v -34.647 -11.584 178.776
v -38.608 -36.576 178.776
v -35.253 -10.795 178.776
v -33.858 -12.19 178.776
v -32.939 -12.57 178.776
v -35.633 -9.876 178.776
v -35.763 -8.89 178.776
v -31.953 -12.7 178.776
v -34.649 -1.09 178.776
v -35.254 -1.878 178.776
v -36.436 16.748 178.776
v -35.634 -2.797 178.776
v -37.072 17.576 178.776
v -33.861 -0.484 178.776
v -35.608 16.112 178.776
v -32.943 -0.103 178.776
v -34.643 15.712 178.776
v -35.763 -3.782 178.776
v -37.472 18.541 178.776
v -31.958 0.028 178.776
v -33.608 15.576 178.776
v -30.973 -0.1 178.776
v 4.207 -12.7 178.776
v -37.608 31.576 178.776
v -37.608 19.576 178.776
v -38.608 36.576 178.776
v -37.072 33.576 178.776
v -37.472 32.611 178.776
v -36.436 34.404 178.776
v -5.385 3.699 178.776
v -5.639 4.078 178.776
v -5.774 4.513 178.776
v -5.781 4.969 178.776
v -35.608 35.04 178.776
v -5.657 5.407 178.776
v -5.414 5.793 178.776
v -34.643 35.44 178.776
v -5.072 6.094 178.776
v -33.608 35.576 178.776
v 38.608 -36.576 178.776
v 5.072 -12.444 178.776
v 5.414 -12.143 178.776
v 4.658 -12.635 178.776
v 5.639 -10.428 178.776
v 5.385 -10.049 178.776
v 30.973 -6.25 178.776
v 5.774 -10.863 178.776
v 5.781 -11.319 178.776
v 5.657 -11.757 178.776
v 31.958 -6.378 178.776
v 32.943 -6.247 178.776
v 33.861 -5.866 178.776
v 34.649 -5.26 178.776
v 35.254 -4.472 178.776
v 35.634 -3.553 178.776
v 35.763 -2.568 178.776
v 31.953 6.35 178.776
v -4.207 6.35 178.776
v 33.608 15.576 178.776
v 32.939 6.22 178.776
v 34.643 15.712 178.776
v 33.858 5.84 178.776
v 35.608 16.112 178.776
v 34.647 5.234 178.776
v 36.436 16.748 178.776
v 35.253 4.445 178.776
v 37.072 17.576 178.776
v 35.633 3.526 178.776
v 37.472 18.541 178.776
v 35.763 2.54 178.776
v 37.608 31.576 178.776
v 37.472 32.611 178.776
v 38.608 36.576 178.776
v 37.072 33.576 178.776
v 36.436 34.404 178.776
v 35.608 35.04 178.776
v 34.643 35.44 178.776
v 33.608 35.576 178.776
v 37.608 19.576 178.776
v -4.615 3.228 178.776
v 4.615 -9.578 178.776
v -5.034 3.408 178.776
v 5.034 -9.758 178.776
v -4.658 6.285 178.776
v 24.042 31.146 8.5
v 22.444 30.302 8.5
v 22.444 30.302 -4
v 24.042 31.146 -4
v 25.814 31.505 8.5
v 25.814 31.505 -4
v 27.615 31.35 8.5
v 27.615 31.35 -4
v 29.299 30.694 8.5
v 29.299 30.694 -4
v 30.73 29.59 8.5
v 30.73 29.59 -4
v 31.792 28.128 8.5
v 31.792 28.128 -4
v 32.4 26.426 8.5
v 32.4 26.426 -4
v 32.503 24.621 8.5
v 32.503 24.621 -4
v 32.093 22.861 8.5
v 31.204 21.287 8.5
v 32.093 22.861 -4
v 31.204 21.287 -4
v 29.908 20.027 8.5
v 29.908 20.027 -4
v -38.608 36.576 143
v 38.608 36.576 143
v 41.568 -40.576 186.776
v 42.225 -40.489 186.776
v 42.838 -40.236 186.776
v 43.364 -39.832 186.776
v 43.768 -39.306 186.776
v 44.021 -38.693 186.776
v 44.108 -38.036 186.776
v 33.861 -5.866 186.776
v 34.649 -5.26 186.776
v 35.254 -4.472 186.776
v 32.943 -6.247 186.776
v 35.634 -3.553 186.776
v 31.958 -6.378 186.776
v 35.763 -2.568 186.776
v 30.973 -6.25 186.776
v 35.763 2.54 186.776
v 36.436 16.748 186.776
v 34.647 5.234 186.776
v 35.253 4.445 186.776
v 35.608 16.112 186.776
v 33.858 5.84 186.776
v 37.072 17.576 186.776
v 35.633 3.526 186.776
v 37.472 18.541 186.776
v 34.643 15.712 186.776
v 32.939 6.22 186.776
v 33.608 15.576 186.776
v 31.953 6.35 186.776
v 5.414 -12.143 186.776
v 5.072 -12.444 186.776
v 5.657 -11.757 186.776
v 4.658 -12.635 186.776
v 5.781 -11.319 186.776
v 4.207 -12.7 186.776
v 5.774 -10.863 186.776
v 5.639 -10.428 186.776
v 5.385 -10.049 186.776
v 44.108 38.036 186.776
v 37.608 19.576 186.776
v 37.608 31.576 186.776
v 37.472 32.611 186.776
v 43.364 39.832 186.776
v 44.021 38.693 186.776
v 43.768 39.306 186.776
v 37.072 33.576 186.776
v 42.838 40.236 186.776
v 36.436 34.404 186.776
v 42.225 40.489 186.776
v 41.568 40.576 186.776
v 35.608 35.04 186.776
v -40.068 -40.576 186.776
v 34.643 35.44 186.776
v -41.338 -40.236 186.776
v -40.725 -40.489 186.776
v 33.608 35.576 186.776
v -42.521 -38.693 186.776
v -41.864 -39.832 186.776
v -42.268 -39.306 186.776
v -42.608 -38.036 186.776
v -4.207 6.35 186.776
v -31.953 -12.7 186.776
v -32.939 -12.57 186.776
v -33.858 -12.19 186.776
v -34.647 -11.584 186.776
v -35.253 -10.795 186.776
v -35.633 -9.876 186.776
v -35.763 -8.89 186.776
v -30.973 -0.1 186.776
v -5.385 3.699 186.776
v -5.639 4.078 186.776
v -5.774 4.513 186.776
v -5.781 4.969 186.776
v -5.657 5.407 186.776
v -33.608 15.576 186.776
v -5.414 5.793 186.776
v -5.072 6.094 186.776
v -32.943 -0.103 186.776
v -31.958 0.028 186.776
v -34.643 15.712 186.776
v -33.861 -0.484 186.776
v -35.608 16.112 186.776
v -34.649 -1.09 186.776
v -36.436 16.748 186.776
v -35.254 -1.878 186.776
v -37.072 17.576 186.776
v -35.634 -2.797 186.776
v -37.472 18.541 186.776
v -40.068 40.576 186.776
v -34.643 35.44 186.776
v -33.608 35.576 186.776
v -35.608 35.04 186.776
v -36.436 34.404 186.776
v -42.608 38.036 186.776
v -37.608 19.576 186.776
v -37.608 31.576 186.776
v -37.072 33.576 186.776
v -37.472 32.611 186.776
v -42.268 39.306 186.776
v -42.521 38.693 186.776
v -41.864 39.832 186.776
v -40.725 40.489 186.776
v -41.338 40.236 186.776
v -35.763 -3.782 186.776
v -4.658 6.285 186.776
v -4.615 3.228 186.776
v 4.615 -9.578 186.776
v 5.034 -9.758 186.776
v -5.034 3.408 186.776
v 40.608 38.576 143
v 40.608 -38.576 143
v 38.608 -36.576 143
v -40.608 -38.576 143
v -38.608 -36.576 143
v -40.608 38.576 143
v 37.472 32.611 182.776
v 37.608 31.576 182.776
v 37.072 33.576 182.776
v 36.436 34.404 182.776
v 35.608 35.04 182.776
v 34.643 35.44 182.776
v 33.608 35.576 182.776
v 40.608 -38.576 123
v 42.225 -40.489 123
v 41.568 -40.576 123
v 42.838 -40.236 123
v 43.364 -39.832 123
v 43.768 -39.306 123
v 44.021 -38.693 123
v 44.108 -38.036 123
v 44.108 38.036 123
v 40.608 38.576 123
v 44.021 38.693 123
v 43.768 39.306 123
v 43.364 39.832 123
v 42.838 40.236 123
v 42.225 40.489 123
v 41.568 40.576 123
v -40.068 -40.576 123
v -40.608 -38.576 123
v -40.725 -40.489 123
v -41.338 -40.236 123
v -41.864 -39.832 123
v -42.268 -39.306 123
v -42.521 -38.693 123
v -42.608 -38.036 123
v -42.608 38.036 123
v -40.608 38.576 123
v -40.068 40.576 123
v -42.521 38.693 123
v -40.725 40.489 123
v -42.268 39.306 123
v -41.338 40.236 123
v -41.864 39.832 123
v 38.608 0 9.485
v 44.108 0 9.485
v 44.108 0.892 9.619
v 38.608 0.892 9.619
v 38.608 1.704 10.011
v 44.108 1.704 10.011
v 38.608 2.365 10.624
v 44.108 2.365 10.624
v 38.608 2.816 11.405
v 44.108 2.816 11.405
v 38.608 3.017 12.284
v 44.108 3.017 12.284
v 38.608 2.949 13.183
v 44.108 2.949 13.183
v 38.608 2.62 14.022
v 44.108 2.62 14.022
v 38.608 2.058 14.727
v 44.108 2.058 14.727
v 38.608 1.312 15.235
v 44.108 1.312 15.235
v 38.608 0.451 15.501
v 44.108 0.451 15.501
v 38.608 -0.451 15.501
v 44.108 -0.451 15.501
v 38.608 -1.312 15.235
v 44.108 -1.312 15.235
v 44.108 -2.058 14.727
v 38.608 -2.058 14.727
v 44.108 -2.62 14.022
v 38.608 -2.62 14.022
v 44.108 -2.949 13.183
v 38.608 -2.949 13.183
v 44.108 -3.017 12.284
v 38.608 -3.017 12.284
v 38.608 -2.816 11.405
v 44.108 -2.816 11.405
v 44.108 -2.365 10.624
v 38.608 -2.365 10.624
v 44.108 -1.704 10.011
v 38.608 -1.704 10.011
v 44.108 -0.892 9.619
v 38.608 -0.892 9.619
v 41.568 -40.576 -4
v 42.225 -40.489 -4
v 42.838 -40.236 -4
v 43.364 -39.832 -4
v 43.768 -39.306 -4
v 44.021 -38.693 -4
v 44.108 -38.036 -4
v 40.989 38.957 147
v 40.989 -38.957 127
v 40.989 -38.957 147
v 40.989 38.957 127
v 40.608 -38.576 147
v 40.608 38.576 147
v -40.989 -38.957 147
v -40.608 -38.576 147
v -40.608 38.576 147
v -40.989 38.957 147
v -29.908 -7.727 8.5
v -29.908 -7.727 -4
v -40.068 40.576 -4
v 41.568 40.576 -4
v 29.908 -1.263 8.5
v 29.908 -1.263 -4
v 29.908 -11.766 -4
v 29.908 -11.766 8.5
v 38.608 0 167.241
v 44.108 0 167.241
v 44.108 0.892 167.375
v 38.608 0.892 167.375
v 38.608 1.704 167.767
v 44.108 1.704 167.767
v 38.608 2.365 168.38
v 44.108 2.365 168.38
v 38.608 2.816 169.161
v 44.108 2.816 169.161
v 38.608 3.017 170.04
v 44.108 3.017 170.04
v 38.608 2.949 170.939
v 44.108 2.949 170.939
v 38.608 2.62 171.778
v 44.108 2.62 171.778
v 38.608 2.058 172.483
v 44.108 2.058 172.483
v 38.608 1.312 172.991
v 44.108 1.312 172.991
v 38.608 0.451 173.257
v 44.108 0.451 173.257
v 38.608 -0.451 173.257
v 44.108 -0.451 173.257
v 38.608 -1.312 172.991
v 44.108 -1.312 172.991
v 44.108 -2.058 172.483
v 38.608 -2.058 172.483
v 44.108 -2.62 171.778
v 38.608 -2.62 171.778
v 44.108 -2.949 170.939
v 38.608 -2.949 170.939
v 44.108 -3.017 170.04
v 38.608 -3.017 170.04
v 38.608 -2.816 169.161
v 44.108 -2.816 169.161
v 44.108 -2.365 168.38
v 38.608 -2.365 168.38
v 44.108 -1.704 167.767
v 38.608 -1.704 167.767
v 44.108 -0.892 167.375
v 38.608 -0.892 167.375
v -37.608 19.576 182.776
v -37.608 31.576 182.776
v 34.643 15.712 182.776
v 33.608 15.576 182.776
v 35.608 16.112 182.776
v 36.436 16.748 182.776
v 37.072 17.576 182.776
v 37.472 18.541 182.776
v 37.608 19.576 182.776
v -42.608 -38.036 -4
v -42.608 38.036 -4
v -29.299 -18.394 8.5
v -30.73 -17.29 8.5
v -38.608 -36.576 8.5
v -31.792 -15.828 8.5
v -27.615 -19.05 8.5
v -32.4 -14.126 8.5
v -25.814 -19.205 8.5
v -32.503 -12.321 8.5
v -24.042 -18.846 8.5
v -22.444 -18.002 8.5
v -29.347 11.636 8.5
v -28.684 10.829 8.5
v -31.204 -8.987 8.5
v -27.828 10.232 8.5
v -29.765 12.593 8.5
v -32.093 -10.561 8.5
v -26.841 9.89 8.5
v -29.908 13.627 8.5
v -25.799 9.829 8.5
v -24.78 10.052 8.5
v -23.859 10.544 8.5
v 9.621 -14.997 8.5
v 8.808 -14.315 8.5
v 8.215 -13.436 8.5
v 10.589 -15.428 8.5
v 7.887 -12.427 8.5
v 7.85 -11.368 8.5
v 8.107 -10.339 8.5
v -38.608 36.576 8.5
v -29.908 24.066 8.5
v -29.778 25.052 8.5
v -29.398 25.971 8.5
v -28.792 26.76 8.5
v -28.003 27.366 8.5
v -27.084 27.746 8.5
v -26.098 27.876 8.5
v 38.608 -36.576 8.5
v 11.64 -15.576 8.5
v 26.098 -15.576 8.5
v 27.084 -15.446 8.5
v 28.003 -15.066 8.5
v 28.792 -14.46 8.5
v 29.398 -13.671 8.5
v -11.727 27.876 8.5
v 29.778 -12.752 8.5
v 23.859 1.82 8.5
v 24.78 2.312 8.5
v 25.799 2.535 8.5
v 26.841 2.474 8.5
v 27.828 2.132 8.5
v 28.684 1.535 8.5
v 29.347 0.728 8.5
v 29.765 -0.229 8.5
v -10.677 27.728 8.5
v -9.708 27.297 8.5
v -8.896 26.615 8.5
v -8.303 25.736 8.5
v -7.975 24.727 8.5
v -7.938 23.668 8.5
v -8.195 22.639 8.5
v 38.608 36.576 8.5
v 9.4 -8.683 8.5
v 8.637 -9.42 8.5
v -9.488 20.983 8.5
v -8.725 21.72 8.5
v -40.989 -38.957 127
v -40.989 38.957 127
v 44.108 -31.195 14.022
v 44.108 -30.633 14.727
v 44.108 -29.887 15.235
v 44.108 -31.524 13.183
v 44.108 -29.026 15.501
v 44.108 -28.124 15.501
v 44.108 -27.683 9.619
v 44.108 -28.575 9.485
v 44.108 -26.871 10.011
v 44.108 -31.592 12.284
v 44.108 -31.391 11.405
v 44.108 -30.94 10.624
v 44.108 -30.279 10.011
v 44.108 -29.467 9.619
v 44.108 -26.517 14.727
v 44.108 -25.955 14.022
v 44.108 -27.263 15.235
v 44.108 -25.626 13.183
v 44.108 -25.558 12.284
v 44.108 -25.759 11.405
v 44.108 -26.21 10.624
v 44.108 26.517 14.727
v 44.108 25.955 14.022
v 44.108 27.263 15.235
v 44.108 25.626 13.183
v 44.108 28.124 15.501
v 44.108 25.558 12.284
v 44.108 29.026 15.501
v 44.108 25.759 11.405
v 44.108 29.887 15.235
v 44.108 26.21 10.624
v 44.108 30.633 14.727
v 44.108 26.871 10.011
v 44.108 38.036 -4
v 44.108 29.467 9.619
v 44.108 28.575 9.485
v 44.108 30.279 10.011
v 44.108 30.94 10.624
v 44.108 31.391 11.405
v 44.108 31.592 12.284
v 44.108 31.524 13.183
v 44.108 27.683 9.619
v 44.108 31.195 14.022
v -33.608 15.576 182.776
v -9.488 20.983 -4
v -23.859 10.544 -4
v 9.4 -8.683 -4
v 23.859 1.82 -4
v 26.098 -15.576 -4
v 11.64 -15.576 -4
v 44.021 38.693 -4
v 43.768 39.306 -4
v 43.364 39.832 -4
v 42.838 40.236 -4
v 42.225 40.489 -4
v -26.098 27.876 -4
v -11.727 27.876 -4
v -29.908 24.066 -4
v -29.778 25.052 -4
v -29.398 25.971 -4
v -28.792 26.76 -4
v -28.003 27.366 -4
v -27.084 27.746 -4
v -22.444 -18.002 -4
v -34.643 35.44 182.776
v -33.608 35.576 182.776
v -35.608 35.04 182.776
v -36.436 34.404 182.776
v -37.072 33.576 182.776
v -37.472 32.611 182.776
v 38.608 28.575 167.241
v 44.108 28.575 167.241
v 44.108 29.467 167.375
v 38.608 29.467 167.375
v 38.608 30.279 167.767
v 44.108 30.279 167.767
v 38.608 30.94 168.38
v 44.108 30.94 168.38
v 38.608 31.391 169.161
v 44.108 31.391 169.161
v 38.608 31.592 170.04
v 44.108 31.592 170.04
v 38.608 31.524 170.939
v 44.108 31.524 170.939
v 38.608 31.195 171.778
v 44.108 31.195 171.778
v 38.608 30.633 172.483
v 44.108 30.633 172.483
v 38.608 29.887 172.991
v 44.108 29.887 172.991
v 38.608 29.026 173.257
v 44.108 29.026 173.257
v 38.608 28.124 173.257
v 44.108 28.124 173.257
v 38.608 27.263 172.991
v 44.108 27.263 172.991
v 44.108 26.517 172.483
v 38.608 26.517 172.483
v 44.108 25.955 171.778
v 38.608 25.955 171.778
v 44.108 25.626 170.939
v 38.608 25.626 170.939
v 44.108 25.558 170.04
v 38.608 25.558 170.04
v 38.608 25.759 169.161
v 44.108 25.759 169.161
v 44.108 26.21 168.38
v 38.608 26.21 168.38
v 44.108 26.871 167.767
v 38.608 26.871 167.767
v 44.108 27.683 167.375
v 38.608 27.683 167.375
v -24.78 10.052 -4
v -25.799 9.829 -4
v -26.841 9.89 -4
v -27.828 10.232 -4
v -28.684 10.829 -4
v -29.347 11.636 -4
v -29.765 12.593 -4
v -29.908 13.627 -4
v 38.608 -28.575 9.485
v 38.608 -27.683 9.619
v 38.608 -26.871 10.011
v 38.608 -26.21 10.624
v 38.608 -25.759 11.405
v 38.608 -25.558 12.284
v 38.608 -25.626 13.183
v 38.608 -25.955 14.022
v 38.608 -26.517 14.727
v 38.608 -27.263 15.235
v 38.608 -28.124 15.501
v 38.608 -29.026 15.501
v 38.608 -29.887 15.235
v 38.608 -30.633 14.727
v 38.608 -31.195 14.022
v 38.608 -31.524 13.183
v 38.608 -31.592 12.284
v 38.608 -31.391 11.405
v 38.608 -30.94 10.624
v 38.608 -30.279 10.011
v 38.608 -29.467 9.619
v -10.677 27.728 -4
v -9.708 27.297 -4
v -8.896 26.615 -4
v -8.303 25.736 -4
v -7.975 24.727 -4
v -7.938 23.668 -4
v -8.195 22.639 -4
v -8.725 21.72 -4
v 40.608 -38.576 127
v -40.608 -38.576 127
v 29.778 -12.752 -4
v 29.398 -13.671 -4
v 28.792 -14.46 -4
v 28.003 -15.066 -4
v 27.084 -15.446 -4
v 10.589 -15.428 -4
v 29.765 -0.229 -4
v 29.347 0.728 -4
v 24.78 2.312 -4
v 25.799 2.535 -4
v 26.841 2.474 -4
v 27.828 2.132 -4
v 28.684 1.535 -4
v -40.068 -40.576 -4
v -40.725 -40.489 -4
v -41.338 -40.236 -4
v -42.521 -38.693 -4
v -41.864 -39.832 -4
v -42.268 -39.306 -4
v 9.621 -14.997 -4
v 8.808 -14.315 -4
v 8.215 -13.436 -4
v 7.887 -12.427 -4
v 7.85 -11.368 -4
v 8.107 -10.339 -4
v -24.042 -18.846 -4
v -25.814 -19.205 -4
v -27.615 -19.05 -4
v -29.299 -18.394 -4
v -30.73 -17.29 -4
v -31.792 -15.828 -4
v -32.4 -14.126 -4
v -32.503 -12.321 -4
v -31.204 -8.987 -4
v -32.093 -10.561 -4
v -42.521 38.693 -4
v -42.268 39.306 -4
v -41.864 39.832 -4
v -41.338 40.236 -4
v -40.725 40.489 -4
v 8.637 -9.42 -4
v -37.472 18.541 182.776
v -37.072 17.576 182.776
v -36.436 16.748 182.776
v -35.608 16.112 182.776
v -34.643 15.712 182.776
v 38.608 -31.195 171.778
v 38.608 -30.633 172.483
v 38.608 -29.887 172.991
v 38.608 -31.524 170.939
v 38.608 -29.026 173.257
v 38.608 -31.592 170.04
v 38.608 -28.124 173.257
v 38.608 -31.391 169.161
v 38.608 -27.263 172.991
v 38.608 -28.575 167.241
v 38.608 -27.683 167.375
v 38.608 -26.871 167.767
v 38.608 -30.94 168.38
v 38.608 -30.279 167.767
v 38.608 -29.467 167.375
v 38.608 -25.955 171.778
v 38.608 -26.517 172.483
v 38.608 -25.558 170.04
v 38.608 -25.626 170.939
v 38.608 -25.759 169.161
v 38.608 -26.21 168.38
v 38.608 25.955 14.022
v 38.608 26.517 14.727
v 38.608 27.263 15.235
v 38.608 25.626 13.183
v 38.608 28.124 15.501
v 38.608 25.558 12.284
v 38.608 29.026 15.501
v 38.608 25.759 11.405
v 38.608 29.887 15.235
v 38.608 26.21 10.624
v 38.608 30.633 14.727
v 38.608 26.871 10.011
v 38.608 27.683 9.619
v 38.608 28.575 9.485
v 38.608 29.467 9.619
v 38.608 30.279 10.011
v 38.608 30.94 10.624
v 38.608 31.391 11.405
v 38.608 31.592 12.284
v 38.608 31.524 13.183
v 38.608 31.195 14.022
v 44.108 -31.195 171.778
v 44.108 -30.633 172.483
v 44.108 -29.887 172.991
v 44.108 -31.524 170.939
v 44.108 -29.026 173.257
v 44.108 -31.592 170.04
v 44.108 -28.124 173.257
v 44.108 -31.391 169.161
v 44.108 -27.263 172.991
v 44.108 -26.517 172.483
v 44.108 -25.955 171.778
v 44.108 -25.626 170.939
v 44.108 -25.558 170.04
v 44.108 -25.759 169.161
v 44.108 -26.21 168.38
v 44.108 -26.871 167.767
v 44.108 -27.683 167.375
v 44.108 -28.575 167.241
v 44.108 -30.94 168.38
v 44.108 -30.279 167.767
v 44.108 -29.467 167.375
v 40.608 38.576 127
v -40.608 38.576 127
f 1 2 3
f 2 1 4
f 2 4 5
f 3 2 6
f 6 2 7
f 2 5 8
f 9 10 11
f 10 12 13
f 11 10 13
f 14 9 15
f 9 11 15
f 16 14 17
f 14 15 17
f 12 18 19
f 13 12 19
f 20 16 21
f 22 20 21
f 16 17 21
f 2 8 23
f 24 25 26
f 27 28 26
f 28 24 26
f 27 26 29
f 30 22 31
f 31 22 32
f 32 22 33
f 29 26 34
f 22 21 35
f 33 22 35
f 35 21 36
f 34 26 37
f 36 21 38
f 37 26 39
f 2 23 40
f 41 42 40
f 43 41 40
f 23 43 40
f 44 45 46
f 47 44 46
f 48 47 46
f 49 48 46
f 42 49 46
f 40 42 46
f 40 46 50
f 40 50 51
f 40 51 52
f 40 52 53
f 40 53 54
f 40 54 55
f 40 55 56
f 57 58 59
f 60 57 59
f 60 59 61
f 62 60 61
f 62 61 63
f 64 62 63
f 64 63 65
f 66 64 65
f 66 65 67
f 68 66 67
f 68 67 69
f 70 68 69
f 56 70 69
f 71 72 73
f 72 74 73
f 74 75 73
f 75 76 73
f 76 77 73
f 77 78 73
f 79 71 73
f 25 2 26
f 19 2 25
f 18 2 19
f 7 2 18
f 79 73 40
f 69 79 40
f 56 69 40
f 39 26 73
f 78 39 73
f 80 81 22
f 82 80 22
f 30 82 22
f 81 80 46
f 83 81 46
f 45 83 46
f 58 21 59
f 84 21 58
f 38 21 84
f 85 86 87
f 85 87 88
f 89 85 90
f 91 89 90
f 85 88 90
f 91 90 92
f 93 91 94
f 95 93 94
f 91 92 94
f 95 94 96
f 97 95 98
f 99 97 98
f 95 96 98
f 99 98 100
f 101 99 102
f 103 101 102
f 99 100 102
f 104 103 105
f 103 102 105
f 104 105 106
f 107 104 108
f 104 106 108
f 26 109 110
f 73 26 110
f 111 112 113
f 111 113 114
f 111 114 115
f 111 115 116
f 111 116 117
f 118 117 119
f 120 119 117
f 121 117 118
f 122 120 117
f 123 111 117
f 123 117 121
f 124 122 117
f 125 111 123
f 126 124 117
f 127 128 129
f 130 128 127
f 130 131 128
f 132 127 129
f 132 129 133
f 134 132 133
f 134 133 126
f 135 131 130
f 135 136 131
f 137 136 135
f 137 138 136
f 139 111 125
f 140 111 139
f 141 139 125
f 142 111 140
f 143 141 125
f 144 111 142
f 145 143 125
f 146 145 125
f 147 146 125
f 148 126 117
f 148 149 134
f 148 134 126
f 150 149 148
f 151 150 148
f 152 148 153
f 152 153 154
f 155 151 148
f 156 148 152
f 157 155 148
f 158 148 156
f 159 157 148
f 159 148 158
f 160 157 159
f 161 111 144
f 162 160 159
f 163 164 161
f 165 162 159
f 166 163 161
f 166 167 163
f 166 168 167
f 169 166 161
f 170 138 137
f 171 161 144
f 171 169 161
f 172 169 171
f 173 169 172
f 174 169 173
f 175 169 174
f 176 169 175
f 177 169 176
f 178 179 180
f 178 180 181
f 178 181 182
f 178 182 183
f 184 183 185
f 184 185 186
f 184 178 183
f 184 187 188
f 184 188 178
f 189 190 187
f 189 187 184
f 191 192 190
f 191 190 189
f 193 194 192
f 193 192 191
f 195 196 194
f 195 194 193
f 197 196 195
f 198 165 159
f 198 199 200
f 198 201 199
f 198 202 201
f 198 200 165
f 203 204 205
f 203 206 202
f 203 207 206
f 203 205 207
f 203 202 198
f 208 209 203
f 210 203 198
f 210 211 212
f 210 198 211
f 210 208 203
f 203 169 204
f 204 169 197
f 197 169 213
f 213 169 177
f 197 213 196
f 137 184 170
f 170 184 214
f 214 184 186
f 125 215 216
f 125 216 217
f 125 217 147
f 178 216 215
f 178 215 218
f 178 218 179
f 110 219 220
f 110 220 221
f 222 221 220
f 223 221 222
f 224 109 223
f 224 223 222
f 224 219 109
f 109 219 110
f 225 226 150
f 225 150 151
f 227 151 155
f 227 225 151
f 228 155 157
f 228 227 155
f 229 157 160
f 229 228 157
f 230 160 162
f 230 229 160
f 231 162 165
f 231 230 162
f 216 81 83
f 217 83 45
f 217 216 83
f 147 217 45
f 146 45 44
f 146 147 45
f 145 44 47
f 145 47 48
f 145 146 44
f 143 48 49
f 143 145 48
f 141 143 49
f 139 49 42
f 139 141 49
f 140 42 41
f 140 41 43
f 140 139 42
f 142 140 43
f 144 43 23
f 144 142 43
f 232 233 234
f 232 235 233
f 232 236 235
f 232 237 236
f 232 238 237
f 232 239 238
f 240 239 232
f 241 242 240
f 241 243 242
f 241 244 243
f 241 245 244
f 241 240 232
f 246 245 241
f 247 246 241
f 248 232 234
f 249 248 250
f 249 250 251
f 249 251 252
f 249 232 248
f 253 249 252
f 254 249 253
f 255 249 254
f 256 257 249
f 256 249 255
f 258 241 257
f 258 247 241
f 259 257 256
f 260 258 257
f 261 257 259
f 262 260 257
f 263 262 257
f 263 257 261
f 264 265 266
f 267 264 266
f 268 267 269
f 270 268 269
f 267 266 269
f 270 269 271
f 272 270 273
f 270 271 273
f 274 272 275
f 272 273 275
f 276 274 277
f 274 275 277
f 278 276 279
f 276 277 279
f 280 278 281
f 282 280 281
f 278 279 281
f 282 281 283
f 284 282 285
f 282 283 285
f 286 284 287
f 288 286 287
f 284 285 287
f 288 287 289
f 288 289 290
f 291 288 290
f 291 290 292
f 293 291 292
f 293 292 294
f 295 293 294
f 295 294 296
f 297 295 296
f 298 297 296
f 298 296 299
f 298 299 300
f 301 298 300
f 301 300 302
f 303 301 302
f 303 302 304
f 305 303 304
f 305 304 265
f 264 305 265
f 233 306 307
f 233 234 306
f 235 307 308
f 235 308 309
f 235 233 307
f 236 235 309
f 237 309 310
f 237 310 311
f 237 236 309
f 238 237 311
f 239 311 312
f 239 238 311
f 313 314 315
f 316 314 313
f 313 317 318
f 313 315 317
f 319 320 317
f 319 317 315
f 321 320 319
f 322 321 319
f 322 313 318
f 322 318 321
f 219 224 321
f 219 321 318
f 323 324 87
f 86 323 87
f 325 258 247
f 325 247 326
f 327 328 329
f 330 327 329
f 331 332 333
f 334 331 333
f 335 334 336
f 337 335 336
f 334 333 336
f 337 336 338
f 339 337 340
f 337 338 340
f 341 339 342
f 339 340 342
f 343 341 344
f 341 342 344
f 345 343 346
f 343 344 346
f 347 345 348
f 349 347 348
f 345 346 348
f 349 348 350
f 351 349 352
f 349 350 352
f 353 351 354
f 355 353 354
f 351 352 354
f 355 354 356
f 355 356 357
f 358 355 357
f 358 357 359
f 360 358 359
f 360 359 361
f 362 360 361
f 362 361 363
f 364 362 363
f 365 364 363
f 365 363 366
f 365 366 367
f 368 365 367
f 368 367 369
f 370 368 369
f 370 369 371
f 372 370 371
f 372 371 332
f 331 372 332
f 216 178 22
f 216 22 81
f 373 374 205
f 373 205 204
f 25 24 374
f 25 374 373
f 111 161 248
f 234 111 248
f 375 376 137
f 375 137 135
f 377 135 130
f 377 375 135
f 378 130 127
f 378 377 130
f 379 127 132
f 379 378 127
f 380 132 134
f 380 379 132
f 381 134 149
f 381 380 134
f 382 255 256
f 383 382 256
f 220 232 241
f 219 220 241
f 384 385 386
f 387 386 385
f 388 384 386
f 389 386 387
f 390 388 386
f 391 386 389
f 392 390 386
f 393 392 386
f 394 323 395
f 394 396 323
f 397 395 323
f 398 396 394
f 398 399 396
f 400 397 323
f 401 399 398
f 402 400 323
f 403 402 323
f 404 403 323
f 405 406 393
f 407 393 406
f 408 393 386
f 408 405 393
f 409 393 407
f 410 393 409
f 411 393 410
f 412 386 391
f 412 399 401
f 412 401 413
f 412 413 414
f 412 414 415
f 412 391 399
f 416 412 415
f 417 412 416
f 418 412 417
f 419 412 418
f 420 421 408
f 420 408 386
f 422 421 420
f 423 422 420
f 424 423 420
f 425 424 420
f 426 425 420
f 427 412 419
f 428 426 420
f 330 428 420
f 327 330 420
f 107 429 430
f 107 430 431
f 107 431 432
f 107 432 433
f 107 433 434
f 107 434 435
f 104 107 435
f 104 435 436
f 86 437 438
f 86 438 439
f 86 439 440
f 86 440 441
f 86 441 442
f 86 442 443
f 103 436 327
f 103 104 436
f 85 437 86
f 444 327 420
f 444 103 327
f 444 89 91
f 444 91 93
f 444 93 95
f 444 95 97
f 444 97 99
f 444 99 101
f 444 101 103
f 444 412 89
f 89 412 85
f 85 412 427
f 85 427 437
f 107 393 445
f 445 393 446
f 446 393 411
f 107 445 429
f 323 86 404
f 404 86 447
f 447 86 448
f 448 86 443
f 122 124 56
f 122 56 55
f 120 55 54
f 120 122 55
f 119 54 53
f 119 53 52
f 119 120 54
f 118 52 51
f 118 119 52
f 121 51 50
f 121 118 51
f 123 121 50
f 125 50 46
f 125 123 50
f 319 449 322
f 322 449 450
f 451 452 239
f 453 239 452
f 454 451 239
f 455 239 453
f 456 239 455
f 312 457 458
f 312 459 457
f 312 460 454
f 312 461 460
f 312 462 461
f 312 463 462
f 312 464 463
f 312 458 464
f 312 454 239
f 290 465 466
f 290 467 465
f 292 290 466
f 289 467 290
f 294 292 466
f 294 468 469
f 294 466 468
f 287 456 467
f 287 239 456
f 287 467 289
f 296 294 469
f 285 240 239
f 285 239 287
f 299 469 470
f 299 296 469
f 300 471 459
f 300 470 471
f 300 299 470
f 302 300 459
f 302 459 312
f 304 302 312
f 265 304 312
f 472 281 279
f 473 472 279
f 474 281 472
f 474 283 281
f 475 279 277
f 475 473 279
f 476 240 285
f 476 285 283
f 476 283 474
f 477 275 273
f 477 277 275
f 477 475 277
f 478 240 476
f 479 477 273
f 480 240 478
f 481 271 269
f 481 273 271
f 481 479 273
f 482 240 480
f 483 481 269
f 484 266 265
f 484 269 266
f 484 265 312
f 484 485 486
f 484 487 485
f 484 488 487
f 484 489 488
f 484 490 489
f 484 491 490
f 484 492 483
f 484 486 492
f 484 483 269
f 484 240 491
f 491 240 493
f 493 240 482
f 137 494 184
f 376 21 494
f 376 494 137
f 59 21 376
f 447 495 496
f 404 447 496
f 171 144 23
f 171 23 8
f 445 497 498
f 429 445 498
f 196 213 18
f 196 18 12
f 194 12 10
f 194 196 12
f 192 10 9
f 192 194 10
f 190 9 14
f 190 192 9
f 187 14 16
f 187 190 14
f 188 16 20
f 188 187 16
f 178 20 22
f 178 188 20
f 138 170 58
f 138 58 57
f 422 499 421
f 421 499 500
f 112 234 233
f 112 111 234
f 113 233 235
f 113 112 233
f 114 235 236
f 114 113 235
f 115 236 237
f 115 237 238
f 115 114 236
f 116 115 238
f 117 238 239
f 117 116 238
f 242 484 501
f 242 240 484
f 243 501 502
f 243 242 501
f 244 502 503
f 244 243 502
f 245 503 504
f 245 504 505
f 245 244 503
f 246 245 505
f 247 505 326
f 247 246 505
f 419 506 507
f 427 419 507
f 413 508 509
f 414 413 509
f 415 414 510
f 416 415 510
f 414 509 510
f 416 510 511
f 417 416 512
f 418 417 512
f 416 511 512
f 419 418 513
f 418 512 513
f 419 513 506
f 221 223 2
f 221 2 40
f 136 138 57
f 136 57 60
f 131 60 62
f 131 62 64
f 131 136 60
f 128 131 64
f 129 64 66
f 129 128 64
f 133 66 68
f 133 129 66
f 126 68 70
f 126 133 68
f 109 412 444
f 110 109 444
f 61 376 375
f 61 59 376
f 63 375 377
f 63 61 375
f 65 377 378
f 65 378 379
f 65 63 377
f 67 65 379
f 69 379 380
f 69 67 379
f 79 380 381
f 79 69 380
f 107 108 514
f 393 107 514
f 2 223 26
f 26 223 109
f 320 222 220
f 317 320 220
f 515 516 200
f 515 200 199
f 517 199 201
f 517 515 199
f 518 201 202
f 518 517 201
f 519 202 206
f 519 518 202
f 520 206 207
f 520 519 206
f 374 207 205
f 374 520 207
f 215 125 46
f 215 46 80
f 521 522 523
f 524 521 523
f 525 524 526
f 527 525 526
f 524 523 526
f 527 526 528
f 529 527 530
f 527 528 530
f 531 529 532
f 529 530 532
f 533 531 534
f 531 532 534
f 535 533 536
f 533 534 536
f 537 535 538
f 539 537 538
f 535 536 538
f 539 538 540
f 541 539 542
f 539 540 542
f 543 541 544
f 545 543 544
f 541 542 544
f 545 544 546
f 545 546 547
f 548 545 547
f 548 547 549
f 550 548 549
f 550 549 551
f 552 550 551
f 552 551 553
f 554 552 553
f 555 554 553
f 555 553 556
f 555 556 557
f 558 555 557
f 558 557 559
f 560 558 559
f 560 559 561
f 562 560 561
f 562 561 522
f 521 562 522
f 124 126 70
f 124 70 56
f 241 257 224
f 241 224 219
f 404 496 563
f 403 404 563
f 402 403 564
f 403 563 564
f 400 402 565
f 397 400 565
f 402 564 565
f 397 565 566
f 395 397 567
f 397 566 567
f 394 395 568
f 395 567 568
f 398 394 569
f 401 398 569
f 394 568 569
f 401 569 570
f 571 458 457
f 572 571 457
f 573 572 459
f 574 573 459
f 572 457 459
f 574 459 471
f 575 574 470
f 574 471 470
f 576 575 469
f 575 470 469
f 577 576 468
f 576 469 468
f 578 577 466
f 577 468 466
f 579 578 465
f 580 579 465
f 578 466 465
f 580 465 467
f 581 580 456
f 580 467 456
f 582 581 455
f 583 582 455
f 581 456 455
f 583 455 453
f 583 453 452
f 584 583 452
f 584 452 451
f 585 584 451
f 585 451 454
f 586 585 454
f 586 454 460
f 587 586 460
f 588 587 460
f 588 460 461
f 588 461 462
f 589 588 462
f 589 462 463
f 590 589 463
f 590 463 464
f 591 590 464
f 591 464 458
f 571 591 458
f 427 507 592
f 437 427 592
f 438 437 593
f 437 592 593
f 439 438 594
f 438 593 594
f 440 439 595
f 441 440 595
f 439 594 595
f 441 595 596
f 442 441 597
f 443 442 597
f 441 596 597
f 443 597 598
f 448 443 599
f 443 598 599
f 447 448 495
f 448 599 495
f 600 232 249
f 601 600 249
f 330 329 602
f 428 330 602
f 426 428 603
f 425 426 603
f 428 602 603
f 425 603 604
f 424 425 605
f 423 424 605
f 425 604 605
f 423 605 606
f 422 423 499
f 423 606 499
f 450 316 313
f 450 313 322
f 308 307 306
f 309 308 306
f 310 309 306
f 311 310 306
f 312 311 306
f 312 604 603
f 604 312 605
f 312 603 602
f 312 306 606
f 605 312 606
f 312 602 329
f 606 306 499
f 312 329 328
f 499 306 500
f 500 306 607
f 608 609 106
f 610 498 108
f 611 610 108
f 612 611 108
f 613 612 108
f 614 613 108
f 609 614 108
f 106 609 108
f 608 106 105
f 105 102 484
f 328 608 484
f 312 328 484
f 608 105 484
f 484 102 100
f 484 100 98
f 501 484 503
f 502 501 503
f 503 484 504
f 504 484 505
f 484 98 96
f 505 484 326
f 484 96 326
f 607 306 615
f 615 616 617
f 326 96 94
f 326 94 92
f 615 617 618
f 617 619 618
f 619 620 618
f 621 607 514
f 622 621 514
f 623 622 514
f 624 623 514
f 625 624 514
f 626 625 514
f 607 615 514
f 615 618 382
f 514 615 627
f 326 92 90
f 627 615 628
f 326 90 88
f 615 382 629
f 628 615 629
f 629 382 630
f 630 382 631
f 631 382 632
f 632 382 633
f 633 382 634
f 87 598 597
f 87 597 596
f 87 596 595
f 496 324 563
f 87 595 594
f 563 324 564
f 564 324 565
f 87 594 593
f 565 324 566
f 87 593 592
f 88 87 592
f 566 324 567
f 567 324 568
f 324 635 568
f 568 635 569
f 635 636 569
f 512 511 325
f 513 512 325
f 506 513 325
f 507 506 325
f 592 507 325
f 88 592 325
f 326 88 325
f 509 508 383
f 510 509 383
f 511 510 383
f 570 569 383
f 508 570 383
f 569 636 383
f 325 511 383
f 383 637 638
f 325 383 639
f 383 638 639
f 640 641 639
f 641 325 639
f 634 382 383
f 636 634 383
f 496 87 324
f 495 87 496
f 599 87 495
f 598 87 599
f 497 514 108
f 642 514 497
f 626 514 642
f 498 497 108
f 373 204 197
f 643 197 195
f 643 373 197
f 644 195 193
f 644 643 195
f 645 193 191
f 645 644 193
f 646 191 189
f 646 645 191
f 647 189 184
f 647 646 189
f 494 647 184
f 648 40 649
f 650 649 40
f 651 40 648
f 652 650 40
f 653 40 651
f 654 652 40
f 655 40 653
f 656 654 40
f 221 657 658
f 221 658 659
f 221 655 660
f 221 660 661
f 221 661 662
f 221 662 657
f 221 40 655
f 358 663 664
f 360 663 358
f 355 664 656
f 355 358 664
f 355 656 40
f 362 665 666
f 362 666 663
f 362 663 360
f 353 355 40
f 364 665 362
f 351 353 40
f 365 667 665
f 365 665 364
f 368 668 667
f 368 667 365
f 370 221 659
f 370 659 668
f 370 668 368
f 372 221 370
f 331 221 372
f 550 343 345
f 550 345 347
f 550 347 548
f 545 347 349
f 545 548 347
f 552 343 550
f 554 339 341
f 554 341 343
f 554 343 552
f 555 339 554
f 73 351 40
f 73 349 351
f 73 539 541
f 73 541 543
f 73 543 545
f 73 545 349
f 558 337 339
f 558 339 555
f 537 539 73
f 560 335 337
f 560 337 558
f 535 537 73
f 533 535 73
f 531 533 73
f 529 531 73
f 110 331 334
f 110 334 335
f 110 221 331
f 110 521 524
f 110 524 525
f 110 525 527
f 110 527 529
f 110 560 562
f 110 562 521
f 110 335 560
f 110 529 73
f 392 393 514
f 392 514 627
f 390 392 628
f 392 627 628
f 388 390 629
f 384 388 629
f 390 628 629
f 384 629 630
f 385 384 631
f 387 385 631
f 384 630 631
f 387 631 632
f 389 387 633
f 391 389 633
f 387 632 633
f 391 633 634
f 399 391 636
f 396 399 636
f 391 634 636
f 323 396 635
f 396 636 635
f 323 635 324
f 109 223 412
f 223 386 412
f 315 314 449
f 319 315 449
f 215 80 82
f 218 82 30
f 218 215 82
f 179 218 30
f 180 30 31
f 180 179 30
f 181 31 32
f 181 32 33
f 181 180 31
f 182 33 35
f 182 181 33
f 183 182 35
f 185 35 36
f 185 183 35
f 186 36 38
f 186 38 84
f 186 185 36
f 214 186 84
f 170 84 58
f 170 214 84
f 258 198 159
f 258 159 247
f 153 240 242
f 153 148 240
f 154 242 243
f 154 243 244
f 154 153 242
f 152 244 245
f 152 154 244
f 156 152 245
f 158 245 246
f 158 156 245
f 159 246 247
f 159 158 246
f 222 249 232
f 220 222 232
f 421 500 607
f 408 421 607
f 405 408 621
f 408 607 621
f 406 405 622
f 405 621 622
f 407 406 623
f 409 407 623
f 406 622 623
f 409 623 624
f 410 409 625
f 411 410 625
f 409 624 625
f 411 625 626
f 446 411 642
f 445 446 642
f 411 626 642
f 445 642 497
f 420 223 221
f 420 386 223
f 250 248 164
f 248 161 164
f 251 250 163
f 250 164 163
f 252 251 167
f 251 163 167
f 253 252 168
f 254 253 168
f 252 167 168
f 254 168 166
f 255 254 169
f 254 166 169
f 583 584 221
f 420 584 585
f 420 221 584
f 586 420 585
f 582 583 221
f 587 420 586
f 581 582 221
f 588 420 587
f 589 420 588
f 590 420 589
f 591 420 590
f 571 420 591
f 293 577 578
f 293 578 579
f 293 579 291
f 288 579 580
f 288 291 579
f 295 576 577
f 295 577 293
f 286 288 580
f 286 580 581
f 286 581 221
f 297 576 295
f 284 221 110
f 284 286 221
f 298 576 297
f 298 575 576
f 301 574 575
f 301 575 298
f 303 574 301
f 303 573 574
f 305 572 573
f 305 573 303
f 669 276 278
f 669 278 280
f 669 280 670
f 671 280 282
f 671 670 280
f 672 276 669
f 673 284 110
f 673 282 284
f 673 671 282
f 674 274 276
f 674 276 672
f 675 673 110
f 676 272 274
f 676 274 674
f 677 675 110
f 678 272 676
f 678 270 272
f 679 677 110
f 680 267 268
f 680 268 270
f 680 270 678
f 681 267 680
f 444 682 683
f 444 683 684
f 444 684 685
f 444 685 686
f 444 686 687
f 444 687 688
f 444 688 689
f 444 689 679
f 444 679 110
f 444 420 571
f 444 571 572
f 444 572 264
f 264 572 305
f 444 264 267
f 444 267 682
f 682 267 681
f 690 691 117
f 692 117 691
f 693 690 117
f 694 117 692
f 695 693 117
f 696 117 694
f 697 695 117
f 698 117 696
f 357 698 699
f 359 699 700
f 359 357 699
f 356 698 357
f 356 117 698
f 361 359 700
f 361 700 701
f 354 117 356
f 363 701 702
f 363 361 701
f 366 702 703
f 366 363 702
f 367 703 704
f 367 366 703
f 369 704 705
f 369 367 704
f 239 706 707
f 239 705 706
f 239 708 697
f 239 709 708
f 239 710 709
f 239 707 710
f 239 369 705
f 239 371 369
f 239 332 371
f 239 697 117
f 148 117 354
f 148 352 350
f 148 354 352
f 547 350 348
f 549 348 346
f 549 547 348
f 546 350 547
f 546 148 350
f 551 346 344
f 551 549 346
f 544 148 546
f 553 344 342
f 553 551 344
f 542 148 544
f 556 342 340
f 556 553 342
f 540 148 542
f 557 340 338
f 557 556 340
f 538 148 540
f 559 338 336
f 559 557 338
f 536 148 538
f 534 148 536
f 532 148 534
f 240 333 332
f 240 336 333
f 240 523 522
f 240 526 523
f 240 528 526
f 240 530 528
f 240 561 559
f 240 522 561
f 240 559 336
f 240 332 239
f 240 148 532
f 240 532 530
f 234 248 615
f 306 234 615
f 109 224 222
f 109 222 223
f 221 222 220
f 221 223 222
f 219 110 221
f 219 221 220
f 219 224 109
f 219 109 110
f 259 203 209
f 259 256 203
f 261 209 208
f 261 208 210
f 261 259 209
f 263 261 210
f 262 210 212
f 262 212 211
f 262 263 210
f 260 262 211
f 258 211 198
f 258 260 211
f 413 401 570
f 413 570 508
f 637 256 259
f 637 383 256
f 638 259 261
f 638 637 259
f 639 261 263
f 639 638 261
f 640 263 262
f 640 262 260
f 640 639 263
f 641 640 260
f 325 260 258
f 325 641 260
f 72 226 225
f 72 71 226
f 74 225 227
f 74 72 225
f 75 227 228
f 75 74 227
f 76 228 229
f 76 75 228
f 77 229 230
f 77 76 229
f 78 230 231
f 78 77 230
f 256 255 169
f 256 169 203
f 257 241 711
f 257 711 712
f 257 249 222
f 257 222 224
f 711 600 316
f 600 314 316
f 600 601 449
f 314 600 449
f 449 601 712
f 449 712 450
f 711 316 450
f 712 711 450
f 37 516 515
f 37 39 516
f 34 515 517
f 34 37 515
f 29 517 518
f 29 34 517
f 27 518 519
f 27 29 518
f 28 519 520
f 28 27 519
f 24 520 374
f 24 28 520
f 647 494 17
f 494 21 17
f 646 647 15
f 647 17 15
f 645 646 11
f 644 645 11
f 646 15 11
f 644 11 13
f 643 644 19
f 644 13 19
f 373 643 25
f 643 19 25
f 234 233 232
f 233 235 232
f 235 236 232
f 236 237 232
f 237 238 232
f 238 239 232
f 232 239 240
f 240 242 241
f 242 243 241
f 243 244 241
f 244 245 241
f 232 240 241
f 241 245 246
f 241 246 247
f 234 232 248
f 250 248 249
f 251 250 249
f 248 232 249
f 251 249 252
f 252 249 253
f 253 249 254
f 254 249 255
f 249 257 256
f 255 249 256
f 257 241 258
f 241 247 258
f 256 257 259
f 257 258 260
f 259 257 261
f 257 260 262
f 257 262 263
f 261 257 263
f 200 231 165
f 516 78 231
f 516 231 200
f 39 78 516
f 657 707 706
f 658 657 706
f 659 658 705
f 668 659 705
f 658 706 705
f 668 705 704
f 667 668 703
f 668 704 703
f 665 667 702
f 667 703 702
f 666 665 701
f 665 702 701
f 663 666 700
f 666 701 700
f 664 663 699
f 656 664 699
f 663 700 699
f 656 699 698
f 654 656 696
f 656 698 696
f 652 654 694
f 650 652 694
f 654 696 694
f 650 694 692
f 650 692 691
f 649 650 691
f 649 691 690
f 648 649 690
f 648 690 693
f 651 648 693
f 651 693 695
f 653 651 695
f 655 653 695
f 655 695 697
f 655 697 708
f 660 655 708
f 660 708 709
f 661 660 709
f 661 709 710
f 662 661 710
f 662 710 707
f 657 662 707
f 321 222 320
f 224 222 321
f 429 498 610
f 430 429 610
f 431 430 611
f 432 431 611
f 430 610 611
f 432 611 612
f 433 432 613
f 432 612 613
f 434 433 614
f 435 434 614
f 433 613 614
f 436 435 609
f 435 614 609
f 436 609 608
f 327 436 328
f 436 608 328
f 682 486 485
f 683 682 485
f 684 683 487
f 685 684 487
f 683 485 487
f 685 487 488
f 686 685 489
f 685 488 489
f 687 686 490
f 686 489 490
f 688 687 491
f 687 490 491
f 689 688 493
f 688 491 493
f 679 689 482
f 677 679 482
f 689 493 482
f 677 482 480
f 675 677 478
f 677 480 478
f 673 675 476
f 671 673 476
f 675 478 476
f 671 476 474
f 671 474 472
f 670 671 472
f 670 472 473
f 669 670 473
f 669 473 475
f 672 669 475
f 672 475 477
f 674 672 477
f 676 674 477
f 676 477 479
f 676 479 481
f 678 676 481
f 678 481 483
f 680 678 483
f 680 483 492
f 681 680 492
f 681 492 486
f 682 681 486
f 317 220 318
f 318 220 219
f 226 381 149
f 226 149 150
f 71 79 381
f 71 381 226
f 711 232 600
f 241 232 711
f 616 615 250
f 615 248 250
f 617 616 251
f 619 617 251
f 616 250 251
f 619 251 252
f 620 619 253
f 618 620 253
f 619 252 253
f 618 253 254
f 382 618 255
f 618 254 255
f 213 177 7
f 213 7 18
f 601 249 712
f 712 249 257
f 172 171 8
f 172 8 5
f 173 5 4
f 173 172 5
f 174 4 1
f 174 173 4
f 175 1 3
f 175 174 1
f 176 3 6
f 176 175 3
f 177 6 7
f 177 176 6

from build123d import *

# Parameters (mm, degrees)
SKETCH1_W            = 85.216
SKETCH1_H            = 81.152
BOSS_EXTRUDE1_DEPTH  = 182.776
SHELL2_T             = -4
SHELL3_T             = -4
SKETCH4_W            = 81.216
SKETCH4_H            = 77.152
SKETCH4_W_2          = 77.216
SKETCH4_H_2          = 73.152
BOSS_EXTRUDE2_DEPTH  = 20
SKETCH5_W            = 81.978
SKETCH5_H            = 77.914
SKETCH5_W_2          = 77.216
SKETCH5_H_2          = 73.152
CUT_EXTRUDE2_DEPTH   = 20
SKETCH6_W            = 75.216
SKETCH6_H            = 20
CUT_EXTRUDE3_DEPTH   = 4
FILLET3_R            = 4
SKETCH7_W            = 85.216
SKETCH7_H            = 81.152
BOSS_EXTRUDE3_DEPTH  = 4
SKETCH8_W            = 85.216
SKETCH8_H            = 81.152
BOSS_EXTRUDE4_DEPTH  = 4
SKETCH9_R            = 3.025
CUT_EXTRUDE4_DEPTH   = 6
SKETCH10_W           = 77.216
SKETCH10_H           = 73.152
BOSS_EXTRUDE5_DEPTH  = 4.500000096
CUT_EXTRUDE5_DEPTH   = 12.5
CUT_EXTRUDE6_DEPTH   = 8
SKETCH13_W           = 59.776
SKETCH13_H           = 81.152
BOSS_EXTRUDE7_DEPTH  = 1.5
SKETCH15_W           = 131
SKETCH15_H           = 81.152
BOSS_EXTRUDE8_DEPTH  = 1.5
FILLET4_R            = 2.54
FILLET5_R            = 2.54
SKETCH16_R           = 3.025
CUT_EXTRUDE9_DEPTH   = 19.5
SKETCH18_W           = 62.209478129
SKETCH18_H           = 16.943734599
BOSS_EXTRUDE9_DEPTH  = 8
SKETCH19_W           = 60.72535539
SKETCH19_H           = 14.841227386
BOSS_EXTRUDE10_DEPTH = 12.5
SKETCH20_W           = 81.216
SKETCH20_H           = 77.152
SKETCH20_W_2         = 77.216
SKETCH20_H_2         = 73.152
BOSS_EXTRUDE11_DEPTH = 20
SKETCH21_W           = 81.216
SKETCH21_H           = 77.152
CUT_EXTRUDE10_DEPTH  = 20


with BuildPart() as part:
    # Sketch1 → Boss-Extrude1 (new body)
    with BuildSketch(Plane.XY):
        Rectangle(SKETCH1_W, SKETCH1_H)
    extrude(amount=BOSS_EXTRUDE1_DEPTH)


with BuildPart() as body_2:
    # Split1: the piece on the far side of the plane
    add(part.part)
    split(bisect_by=Plane(origin=(0, 0, 127), x_dir=(-1, 0, 0), z_dir=(0, 0, -1)), keep=Keep.BOTTOM)

    # Shell3
    shell3_openings = [body_2.faces().sort_by_distance(p)[0] for p in [
        (0, 0, 127),
    ]]
    offset(amount=SHELL3_T, openings=shell3_openings, kind=Kind.INTERSECTION)

    # Sketch5 → Cut-Extrude2 (cut)
    with BuildSketch(Plane(origin=(0, 0, 127), x_dir=(-1, 0, 0), z_dir=(0, 0, -1))):
        Rectangle(SKETCH5_W, SKETCH5_H)
        Rectangle(SKETCH5_W_2, SKETCH5_H_2, mode=Mode.SUBTRACT)
    extrude(amount=-CUT_EXTRUDE2_DEPTH, mode=Mode.SUBTRACT)

    # Sketch6 → Cut-Extrude3 (cut)
    with BuildSketch(Plane.XY.offset(182.776)):
        with Locations((0, 25.576)):
            Rectangle(SKETCH6_W, SKETCH6_H)
    extrude(amount=-CUT_EXTRUDE3_DEPTH, mode=Mode.SUBTRACT)

    # Fillet3
    fillet3_edges = [body_2.edges().sort_by_distance(p)[0] for p in [
        (37.608, 35.576, 180.776),
        (37.608, 15.576, 180.776),
        (-37.608, 15.576, 180.776),
        (-37.608, 35.576, 180.776),
    ]]
    fillet(fillet3_edges, radius=FILLET3_R)

    # Sketch7 → Boss-Extrude3 (add)
    with BuildSketch(Plane.XY.offset(182.776)):
        Rectangle(SKETCH7_W, SKETCH7_H)
        with BuildLine():
            Line((-33.608, 15.576), (33.608, 15.576))
            ThreePointArc((33.608, 15.576), (36.436427125, 16.747572875), (37.608, 19.576))
            Line((37.608, 19.576), (37.608, 31.576))
            ThreePointArc((37.608, 31.576), (36.436427125, 34.404427125), (33.608, 35.576))
            Line((33.608, 35.576), (-33.608, 35.576))
            ThreePointArc((-33.608, 35.576), (-36.436427125, 34.404427125), (-37.608, 31.576))
            Line((-37.608, 31.576), (-37.608, 19.576))
            ThreePointArc((-37.608, 19.576), (-36.436427125, 16.747572875), (-33.608, 15.576))
        make_face(mode=Mode.SUBTRACT)
    extrude(amount=BOSS_EXTRUDE3_DEPTH)

    # Sketch9 → Cut-Extrude4 (cut)
    with BuildSketch(Plane.XY.offset(186.776)):
        with Locations((-21.304, -27.876)):
            Circle(SKETCH9_R)
        with Locations((0, -27.876)):
            Circle(SKETCH9_R)
        with Locations((21.304, -27.876)):
            Circle(SKETCH9_R)
    cut_extrude4 = extrude(amount=-CUT_EXTRUDE4_DEPTH, mode=Mode.SUBTRACT)

    # Sketch12 → Cut-Extrude6 (cut)
    with BuildSketch(Plane.XY.offset(186.776)):
        with BuildLine():
            Line((-30.972571902, -0.100195505), (4.615140384, -9.578475727))
            ThreePointArc((4.615140384, -9.578475727), (5.780649168, -11.318525139), (4.206574871, -12.7))
            Line((4.206574871, -12.7), (-31.953129133, -12.7))
            ThreePointArc((-31.953129133, -12.7), (-34.64720597, -11.584076836), (-35.763129133, -8.89))
            Line((-35.763129133, -8.89), (-35.763129133, -3.781853761))
            ThreePointArc((-35.763129133, -3.781853761), (-34.274785541, -0.760924844), (-30.972571902, -0.100195505))
        make_face()
        with BuildLine():
            Line((-4.206574871, 6.35), (31.953129133, 6.35))
            ThreePointArc((31.953129133, 6.35), (34.64720597, 5.234076836), (35.763129133, 2.54))
            Line((35.763129133, 2.54), (35.763129133, -2.568146239))
            ThreePointArc((35.763129133, -2.568146239), (34.274785541, -5.589075156), (30.972571902, -6.249804495))
            Line((30.972571902, -6.249804495), (-4.615140384, 3.228475727))
            ThreePointArc((-4.615140384, 3.228475727), (-5.780649168, 4.968525139), (-4.206574871, 6.35))
        make_face()
    extrude(amount=-CUT_EXTRUDE6_DEPTH, mode=Mode.SUBTRACT)


with BuildPart() as part_1:
    add(part.part)

    # Split1
    split(bisect_by=Plane(origin=(0, 0, 127), x_dir=(-1, 0, 0), z_dir=(0, 0, -1)), keep=Keep.TOP)

    # Shell2
    shell2_openings = [part_1.faces().sort_by_distance(p)[0] for p in [
        (0, 0, 127),
    ]]
    offset(amount=SHELL2_T, openings=shell2_openings, kind=Kind.INTERSECTION)

    # Sketch4 → Boss-Extrude2 (add)
    with BuildSketch(Plane.XY.offset(127)):
        Rectangle(SKETCH4_W, SKETCH4_H)
        Rectangle(SKETCH4_W_2, SKETCH4_H_2, mode=Mode.SUBTRACT)
    extrude(amount=BOSS_EXTRUDE2_DEPTH)

    # Sketch8 → Boss-Extrude4 (add)
    with BuildSketch(Plane(origin=(0, 0, 0), x_dir=(-1, 0, 0), z_dir=(0, 0, -1))):
        Rectangle(SKETCH8_W, SKETCH8_H)
    extrude(amount=BOSS_EXTRUDE4_DEPTH)

    # Mirror1: Cut-Extrude4 across plane
    add(cut_extrude4.mirror(Plane.XY.offset(91.388)), mode=Mode.SUBTRACT)

    # Sketch10 → Boss-Extrude5 (add)
    with BuildSketch(Plane.XY.offset(4)):
        Rectangle(SKETCH10_W, SKETCH10_H)
    extrude(amount=BOSS_EXTRUDE5_DEPTH)

    # Sketch11 → Cut-Extrude5 (cut)
    with BuildSketch(Plane(origin=(0, 0, -4), x_dir=(-1, 0, 0), z_dir=(0, 0, -1))):
        with BuildLine():
            ThreePointArc((29.908, 24.066), (28.792076836, 26.760076836), (26.098, 27.876))
            Line((26.098, 27.876), (11.727473696, 27.876))
            ThreePointArc((11.727473696, 27.876), (8.103904131, 25.243218589), (9.488243538, 20.983476959))
            Line((9.488243538, 20.983476959), (23.858769841, 10.544328421))
            ThreePointArc((23.858769841, 10.544328421), (27.827831364, 10.232181603), (29.908, 13.626851462))
            Line((29.908, 13.626851462), (29.908, 24.066))
        make_face()
        with BuildLine():
            ThreePointArc((-23.858769841, 1.819526927), (-27.827831364, 2.131673746), (-29.908, -1.262996113))
            Line((-29.908, -1.262996113), (-29.908, -11.766))
            ThreePointArc((-29.908, -11.766), (-28.792076836, -14.460076836), (-26.098, -15.576))
            Line((-26.098, -15.576), (-11.639570458, -15.576))
            ThreePointArc((-11.639570458, -15.576), (-8.016000893, -12.943218589), (-9.400340299, -8.683476959))
            Line((-9.400340299, -8.683476959), (-23.858769841, 1.819526927))
        make_face()
        with BuildLine():
            ThreePointArc((22.443899471, -18.002473668), (31.313488137, -16.596985531), (29.908, -7.727396865))
            Line((29.908, -7.727396865), (-22.443899471, 30.302473668))
            ThreePointArc((-22.443899471, 30.302473668), (-31.313488137, 28.896985531), (-29.908, 20.027396865))
            Line((-29.908, 20.027396865), (22.443899471, -18.002473668))
        make_face()
    extrude(amount=-CUT_EXTRUDE5_DEPTH, mode=Mode.SUBTRACT)

    add(body_2.part)  # Boss-Extrude7 merges body 2
    # Sketch13 → Boss-Extrude7 (add)
    with BuildSketch(Plane.ZY.offset(-42.608)):
        with Locations((156.888, 0)):
            Rectangle(SKETCH13_W, SKETCH13_H)
    extrude(amount=-BOSS_EXTRUDE7_DEPTH)

    # Sketch15 → Boss-Extrude8 (add)
    with BuildSketch(Plane(origin=(42.608, 0, 0), x_dir=(0, 0, -1), z_dir=(1, 0, 0))):
        with Locations((-61.5, 0)):
            Rectangle(SKETCH15_W, SKETCH15_H)
    extrude(amount=BOSS_EXTRUDE8_DEPTH)


with BuildPart() as body_2_2:
    # Split2: the piece on the far side of the plane
    add(part_1.part)
    split(bisect_by=Plane(origin=(0, 0, 123), x_dir=(-1, 0, 0), z_dir=(0, 0, -1)), keep=Keep.BOTTOM)

    # Fillet4
    fillet4_edges = [body_2_2.edges().sort_by_distance(p)[0] for p in [
        (44.108, -40.576, 154.888),
        (44.108, 40.576, 154.888),
        (-42.608, 40.576, 154.888),
        (-42.608, -40.576, 154.888),
    ]]
    fillet(fillet4_edges, radius=FILLET4_R)


with BuildPart() as part_2:
    add(part_1.part)

    # Split2
    split(bisect_by=Plane(origin=(0, 0, 123), x_dir=(-1, 0, 0), z_dir=(0, 0, -1)), keep=Keep.TOP)

    # Fillet5
    fillet5_edges = [part_2.edges().sort_by_distance(p)[0] for p in [
        (44.108, -40.576, 59.5),
        (44.108, 40.576, 59.5),
        (-42.608, 40.576, 59.5),
        (-42.608, -40.576, 59.5),
    ]]
    fillet(fillet5_edges, radius=FILLET5_R)


with BuildPart() as cut_extrude9_tool:
    # Sketch16 → Cut-Extrude9 (new body)
    with BuildSketch(Plane(origin=(44.108, 0, 0), x_dir=(0, 0, -1), z_dir=(1, 0, 0))):
        with Locations((-170.266, 28.575)):
            Circle(SKETCH16_R)
        with Locations((-170.266, 0)):
            Circle(SKETCH16_R)
        with Locations((-170.266, -28.575)):
            Circle(SKETCH16_R)
        with Locations((-12.51, 28.575)):
            Circle(SKETCH16_R)
        with Locations((-12.51, 0)):
            Circle(SKETCH16_R)
        with Locations((-12.51, -28.575)):
            Circle(SKETCH16_R)
    extrude(amount=-CUT_EXTRUDE9_DEPTH)


with BuildPart() as part_3:
    add(part_2.part)

    # Cut-Extrude9: cut by cut_extrude9_tool
    add(cut_extrude9_tool.part, mode=Mode.SUBTRACT)

    # Sketch19 → Boss-Extrude10 (add)
    with BuildSketch(Plane(origin=(0, 0, -4), x_dir=(-1, 0, 0), z_dir=(0, 0, -1))):
        with Locations((-1.053899817, -28.260170482)):
            Rectangle(SKETCH19_W, SKETCH19_H)
    extrude(amount=-BOSS_EXTRUDE10_DEPTH)

    # Sketch20 → Boss-Extrude11 (add)
    with BuildSketch(Plane.XY.offset(123)):
        Rectangle(SKETCH20_W, SKETCH20_H)
        Rectangle(SKETCH20_W_2, SKETCH20_H_2, mode=Mode.SUBTRACT)
    extrude(amount=BOSS_EXTRUDE11_DEPTH)


with BuildPart() as body_2_2_1:
    add(body_2_2.part)

    # Cut-Extrude9: cut by cut_extrude9_tool
    add(cut_extrude9_tool.part, mode=Mode.SUBTRACT)

    # Sketch18 → Boss-Extrude9 (add)
    with BuildSketch(Plane.XY.offset(186.776)):
        with Locations((0.188161552, -26.961563086)):
            Rectangle(SKETCH18_W, SKETCH18_H)
    extrude(amount=-BOSS_EXTRUDE9_DEPTH)

    # Sketch21 → Cut-Extrude10 (cut)
    with BuildSketch(Plane(origin=(0, 0, 123), x_dir=(-1, 0, 0), z_dir=(0, 0, -1))):
        Rectangle(SKETCH21_W, SKETCH21_H)
    extrude(amount=-CUT_EXTRUDE10_DEPTH, mode=Mode.SUBTRACT)


solid = Compound([part_3.part, body_2_2_1.part])
